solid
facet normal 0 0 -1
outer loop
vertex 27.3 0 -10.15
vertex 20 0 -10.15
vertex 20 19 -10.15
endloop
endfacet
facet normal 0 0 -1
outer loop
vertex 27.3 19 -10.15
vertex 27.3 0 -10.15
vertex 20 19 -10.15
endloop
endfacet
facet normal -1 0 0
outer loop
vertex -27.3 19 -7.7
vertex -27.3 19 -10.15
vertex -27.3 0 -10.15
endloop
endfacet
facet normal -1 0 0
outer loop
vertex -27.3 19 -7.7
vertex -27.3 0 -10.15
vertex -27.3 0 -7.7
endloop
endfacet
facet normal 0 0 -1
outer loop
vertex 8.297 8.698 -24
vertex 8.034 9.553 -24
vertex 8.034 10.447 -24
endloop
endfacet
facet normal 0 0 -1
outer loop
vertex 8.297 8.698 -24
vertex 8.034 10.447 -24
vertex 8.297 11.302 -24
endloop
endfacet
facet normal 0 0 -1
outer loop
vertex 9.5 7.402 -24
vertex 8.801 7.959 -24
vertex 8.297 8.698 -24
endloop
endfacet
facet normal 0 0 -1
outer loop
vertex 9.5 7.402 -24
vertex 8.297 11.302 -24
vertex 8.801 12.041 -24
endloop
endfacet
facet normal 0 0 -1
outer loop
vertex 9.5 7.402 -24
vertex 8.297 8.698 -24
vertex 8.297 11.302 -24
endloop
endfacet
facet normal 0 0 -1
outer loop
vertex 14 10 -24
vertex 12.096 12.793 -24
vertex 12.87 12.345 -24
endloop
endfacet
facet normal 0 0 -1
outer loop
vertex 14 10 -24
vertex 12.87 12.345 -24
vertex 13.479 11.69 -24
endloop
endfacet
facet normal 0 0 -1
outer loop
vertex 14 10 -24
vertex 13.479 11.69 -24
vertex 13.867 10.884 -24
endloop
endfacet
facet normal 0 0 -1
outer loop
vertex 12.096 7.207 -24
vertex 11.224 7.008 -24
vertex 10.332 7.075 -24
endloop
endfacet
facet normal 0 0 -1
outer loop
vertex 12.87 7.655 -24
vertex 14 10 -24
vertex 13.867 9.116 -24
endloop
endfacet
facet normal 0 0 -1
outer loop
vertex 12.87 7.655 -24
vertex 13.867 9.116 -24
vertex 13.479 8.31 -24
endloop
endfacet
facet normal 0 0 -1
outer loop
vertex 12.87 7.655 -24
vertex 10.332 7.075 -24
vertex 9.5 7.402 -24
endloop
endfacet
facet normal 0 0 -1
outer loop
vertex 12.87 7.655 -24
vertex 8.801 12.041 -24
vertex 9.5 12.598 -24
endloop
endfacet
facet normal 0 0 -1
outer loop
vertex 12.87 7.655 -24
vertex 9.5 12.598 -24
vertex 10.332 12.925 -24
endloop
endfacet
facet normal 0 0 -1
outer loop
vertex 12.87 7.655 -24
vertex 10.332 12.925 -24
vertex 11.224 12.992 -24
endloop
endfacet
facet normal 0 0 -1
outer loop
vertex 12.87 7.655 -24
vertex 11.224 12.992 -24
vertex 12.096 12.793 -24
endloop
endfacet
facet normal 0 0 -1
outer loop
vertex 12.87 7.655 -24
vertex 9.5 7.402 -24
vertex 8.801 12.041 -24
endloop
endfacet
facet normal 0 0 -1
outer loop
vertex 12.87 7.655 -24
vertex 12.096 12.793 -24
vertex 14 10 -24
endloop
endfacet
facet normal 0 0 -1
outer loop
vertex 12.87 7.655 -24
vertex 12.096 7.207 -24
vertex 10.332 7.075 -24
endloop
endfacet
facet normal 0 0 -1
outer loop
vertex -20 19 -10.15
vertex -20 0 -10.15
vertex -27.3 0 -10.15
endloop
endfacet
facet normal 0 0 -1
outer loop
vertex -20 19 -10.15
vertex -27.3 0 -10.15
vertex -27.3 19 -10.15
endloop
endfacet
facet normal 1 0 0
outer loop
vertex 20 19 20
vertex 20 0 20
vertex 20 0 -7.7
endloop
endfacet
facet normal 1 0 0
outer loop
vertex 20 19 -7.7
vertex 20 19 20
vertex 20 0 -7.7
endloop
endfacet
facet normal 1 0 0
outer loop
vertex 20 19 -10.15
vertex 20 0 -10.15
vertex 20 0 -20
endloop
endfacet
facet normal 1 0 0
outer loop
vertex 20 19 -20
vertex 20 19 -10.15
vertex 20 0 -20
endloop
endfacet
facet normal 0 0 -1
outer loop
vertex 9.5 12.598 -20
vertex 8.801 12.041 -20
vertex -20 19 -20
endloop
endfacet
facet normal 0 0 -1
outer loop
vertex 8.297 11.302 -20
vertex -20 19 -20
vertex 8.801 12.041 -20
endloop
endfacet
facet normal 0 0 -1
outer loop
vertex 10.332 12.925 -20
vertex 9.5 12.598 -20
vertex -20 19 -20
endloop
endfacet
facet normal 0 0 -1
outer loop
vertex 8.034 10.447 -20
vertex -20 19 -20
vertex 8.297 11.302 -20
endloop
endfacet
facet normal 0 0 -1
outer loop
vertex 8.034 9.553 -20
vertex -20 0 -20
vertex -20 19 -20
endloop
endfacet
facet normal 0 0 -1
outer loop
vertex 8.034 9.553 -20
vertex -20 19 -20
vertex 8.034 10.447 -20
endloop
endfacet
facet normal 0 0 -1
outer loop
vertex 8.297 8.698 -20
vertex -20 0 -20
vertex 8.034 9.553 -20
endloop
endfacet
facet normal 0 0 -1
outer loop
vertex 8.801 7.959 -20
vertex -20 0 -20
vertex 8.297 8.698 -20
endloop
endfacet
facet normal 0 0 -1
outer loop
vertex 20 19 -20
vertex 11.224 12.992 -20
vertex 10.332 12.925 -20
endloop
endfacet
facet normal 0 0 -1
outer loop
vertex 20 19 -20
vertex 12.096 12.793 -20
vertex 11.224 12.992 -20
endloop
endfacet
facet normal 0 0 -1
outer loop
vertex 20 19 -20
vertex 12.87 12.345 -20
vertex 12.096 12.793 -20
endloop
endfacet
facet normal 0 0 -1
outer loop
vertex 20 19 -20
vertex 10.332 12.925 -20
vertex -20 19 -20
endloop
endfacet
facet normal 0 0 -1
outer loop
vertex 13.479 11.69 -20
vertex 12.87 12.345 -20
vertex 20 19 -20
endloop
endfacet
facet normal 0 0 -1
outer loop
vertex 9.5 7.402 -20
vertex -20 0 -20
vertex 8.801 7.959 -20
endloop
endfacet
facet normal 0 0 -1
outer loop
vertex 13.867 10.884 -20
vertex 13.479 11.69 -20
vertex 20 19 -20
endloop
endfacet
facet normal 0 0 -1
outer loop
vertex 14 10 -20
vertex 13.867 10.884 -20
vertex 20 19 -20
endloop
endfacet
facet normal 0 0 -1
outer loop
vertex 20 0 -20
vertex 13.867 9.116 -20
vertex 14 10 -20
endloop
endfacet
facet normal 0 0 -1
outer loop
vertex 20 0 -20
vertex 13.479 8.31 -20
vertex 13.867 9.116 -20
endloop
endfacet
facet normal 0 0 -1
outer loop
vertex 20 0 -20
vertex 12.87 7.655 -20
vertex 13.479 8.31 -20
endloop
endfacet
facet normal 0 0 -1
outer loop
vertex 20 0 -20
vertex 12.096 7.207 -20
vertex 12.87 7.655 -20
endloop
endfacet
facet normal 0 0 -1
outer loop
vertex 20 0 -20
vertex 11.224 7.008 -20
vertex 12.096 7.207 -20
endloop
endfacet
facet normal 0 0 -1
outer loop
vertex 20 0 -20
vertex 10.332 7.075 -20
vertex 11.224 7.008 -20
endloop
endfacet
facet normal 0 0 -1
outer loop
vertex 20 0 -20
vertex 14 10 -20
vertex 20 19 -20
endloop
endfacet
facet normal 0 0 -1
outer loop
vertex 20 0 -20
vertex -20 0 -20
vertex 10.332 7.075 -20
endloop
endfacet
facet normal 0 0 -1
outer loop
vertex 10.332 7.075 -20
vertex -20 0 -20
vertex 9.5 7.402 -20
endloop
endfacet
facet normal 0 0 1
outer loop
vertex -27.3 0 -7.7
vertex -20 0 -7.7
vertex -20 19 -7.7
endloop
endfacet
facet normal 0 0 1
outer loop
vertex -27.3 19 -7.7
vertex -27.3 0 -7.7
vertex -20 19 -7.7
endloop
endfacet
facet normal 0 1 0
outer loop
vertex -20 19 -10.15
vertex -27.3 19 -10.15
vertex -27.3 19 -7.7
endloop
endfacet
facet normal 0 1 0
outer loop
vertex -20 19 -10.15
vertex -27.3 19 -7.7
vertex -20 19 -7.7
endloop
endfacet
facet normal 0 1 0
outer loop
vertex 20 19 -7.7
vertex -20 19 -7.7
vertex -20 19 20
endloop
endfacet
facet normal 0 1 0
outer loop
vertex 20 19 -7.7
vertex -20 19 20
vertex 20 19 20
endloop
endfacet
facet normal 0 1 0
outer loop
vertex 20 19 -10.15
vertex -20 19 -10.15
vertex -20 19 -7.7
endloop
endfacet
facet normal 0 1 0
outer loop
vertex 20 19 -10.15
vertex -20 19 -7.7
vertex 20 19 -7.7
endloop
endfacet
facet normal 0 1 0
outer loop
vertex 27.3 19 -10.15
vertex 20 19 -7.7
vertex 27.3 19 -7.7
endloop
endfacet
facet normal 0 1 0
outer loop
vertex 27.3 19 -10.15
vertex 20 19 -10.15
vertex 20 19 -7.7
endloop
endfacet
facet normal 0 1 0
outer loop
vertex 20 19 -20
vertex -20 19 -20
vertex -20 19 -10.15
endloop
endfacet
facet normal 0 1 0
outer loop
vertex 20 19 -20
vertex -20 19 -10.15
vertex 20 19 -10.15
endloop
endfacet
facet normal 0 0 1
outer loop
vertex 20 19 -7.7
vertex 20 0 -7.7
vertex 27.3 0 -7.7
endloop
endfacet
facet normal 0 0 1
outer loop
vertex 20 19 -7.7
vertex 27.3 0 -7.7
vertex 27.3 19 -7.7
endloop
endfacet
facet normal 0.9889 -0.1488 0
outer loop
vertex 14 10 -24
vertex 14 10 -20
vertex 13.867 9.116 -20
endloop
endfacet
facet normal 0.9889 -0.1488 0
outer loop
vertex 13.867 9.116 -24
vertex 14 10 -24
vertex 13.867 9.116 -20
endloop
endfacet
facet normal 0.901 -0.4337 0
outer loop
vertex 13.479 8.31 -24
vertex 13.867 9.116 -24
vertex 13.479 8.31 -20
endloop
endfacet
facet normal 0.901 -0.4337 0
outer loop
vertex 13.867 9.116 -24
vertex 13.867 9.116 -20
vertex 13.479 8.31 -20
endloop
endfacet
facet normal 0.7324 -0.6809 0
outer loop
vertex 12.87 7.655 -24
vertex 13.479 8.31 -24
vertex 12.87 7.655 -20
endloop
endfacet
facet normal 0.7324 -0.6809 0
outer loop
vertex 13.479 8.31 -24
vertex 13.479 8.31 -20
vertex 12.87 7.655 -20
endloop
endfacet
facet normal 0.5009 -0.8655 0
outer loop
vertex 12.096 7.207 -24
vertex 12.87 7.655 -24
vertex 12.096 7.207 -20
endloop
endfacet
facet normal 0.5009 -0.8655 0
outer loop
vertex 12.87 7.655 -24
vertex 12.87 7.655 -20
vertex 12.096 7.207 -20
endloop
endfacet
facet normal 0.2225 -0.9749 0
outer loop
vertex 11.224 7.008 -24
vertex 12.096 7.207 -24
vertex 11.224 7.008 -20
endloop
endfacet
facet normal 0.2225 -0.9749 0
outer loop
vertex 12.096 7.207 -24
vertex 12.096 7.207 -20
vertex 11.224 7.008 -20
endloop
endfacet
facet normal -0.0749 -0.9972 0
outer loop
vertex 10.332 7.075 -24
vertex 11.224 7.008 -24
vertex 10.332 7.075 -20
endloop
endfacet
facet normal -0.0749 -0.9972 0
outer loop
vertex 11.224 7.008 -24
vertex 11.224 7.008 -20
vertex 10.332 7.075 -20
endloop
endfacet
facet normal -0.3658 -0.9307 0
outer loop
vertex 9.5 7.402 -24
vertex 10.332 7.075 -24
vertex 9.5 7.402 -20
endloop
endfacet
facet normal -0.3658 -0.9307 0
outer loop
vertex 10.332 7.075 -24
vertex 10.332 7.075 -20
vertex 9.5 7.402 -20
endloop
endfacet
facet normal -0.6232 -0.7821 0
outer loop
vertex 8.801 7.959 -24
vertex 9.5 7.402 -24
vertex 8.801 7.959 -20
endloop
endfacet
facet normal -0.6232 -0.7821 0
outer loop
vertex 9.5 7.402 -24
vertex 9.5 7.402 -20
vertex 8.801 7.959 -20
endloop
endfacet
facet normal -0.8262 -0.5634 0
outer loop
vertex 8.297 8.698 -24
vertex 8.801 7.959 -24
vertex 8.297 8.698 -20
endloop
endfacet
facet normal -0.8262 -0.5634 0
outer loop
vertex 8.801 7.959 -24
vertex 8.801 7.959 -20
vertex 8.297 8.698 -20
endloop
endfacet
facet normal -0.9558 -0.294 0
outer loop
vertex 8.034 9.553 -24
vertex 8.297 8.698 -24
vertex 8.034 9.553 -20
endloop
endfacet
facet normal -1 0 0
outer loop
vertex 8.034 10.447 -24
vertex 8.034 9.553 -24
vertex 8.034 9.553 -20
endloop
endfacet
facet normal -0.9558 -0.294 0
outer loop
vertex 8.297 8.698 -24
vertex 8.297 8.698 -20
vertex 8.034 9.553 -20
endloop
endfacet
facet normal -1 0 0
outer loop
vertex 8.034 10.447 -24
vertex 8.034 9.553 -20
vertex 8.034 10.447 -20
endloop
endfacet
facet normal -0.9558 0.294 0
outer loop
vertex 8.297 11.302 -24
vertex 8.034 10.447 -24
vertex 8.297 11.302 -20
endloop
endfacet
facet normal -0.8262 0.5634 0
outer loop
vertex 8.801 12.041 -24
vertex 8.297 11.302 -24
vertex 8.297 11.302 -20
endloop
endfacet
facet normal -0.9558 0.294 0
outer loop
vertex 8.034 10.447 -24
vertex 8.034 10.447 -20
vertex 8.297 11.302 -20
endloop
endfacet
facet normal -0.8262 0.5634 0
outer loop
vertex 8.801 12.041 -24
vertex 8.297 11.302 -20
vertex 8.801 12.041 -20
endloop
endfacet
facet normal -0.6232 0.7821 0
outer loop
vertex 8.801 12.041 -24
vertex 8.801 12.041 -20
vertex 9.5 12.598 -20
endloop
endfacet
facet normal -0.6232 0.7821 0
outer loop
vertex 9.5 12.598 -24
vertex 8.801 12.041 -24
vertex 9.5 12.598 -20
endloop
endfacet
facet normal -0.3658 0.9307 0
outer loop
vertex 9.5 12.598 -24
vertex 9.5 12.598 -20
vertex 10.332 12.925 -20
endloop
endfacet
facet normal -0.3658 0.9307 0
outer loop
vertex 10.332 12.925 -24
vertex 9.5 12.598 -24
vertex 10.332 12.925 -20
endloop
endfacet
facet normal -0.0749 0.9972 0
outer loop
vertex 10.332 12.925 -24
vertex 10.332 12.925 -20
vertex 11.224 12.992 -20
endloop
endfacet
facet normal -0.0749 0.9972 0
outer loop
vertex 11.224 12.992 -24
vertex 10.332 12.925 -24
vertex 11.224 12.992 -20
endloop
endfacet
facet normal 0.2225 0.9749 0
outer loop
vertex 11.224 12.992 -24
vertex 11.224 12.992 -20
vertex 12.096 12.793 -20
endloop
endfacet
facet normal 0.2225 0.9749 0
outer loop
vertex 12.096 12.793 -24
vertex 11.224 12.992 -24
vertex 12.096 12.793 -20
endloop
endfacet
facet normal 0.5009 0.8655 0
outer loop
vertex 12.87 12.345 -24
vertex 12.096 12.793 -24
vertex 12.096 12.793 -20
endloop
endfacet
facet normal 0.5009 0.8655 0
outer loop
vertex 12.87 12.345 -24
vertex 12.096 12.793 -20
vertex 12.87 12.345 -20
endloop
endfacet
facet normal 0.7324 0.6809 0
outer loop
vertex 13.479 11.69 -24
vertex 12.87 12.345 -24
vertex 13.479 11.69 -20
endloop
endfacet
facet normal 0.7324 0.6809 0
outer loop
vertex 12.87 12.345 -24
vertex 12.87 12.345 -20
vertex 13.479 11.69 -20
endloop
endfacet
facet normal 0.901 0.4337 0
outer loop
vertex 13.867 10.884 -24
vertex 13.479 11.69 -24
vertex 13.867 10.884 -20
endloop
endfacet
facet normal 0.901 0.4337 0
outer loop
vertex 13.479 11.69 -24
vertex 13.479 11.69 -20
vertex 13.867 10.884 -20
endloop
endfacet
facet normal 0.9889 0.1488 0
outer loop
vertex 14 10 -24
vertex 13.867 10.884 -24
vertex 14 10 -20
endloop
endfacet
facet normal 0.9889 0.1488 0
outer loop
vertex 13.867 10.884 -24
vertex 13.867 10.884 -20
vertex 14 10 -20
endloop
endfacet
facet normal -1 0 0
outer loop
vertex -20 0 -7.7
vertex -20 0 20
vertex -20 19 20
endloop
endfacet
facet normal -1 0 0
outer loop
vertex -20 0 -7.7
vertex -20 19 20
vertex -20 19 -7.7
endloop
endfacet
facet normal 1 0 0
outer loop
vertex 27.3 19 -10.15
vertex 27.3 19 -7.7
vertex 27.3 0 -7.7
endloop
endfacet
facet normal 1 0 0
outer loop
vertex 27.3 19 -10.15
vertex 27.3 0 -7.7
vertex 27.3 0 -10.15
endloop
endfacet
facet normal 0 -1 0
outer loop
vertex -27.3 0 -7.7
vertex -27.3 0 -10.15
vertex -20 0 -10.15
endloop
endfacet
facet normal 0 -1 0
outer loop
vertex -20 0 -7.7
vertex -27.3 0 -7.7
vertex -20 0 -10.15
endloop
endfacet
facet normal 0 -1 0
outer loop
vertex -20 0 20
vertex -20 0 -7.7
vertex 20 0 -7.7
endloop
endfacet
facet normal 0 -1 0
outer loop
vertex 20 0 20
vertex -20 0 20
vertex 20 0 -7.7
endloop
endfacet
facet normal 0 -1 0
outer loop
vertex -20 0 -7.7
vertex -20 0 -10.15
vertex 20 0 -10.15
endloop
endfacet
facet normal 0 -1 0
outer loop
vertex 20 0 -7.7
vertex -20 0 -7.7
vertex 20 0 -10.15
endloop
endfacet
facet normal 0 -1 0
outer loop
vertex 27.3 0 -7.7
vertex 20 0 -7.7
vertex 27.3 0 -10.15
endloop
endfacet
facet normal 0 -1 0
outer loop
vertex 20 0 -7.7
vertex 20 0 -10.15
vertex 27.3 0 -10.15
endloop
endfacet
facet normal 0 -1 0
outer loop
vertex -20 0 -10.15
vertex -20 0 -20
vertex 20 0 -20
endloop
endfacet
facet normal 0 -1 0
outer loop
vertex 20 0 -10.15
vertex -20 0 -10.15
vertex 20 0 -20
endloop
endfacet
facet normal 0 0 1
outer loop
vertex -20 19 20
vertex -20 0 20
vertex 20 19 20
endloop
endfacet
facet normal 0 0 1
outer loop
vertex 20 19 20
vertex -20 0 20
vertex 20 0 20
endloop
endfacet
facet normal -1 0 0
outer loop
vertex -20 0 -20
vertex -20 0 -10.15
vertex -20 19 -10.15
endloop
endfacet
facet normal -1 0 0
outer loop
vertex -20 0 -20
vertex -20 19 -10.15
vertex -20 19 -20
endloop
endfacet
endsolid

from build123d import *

# Parameters (mm, degrees)
SKETCH_1_W      = 40
SKETCH_1_H      = 40
EXTRUDE_1_DEPTH = 19
SKETCH_2_R      = 3
EXTRUDE_2_DEPTH = 4
SKETCH_3_W      = 2.45
SKETCH_3_H      = 19
EXTRUDE_3_DEPTH = 7.3
SKETCH_5_W      = 2.45
SKETCH_5_H      = 19
EXTRUDE_4_DEPTH = 7.3


with BuildPart() as part:
    # Эскиз1 → Бобышка-Вытянуть1 (new body)
    with BuildSketch(Plane(origin=(0, 0, 0), x_dir=(1, 0, 0), z_dir=(0, 1, 0))):
        Rectangle(SKETCH_1_W, SKETCH_1_H)
    extrude(amount=EXTRUDE_1_DEPTH)

    # Эскиз2 → Бобышка-Вытянуть2 (add)
    with BuildSketch(Plane(origin=(0, 0, -20), x_dir=(-1, 0, 0), z_dir=(0, 0, -1))):
        with Locations(Location((-11, 10, 0), (0, 0, 180))):
            Circle(SKETCH_2_R)
    extrude(amount=EXTRUDE_2_DEPTH)

    # Эскиз3 → Бобышка-Вытянуть3 (add)
    with BuildSketch(Plane(origin=(20, 0, 0), x_dir=(0, 0, -1), z_dir=(1, 0, 0))):
        with Locations((8.925, 9.5)):
            Rectangle(SKETCH_3_W, SKETCH_3_H)
    extrude(amount=EXTRUDE_3_DEPTH)

    # Эскиз5 → Бобышка-Вытянуть4 (add)
    with BuildSketch(Plane.ZY.offset(20)):
        with Locations((-8.925, 9.5)):
            Rectangle(SKETCH_5_W, SKETCH_5_H)
    extrude(amount=EXTRUDE_4_DEPTH)


solid = part.part
